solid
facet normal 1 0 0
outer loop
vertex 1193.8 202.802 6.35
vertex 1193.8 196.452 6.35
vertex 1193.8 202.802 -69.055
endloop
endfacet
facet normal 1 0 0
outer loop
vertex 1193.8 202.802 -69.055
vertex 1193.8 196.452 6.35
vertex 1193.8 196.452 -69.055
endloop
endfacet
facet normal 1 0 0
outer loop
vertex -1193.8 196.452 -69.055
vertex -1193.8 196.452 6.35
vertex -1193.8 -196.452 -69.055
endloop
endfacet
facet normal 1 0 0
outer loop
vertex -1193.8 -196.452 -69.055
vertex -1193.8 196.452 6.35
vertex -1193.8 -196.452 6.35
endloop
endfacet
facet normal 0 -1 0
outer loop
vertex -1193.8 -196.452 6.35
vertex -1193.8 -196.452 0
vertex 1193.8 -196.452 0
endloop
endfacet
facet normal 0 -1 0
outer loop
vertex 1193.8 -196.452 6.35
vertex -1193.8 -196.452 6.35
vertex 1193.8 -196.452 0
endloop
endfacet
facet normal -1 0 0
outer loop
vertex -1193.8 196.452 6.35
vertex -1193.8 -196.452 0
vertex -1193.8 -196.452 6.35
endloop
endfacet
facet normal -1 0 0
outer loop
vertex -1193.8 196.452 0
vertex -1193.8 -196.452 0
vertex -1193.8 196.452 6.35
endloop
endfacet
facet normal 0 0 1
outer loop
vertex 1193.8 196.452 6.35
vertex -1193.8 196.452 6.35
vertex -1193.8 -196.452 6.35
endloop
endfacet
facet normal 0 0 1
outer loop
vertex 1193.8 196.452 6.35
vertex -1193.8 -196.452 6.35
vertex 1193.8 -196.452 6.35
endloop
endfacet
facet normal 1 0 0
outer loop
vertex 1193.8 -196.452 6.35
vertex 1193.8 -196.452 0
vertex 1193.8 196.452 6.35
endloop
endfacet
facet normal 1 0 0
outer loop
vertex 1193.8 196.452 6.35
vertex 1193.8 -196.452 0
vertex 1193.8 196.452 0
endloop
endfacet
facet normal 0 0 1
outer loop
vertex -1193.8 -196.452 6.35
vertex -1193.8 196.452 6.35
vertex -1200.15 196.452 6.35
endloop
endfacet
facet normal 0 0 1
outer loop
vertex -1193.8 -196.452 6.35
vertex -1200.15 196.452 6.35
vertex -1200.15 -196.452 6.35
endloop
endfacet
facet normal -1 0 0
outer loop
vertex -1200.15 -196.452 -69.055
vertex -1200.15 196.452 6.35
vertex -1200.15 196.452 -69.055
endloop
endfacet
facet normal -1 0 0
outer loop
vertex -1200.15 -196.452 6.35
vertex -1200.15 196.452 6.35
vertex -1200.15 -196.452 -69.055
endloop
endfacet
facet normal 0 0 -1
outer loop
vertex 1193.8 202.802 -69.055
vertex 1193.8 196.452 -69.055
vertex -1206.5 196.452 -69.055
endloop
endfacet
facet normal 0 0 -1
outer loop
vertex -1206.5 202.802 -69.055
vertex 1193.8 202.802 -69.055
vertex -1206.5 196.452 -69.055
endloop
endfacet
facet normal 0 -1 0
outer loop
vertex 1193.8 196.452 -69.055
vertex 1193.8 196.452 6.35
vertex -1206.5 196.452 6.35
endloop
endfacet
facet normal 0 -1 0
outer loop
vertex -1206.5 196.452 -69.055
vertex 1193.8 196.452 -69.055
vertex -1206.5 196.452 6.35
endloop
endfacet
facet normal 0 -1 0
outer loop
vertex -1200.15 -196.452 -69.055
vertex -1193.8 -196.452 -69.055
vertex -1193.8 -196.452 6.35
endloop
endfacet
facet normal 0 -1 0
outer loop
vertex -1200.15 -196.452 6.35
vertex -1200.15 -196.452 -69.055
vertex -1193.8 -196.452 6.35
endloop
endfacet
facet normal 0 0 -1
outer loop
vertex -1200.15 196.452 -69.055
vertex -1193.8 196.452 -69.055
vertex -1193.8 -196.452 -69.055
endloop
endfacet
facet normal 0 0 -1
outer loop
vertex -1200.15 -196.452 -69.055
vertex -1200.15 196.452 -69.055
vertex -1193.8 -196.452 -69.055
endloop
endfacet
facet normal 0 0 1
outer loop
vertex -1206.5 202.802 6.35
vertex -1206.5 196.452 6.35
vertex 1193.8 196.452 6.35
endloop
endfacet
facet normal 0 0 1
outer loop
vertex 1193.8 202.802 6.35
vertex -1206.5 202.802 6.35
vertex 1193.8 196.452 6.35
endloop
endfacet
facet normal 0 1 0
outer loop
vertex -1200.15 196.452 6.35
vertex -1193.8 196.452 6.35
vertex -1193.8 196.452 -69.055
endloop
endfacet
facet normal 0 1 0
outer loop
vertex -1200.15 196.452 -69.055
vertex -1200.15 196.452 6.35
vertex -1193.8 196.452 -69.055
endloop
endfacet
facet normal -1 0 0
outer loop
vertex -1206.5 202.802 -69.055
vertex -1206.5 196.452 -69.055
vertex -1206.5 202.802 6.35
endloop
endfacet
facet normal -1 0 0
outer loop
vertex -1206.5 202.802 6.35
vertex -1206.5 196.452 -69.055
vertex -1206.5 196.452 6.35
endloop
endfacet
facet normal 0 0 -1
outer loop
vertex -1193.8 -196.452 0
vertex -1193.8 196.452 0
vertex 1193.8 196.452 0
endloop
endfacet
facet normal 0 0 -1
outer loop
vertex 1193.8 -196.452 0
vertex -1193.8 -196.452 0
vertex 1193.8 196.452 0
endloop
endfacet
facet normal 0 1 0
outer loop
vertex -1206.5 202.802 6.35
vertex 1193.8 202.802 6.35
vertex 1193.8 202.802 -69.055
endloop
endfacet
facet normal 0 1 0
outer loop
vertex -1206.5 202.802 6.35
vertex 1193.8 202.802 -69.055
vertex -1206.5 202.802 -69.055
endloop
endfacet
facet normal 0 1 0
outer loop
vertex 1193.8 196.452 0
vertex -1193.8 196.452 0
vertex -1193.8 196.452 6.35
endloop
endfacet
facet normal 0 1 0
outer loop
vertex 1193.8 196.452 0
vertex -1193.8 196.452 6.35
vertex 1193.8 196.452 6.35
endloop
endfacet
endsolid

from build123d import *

# Parameters (mm, degrees)
F0_W     = 2387.6
F0_H     = 392.90498
F1_DEPTH = 6.35
F2_W     = 392.90498
F2_H     = 69.05498
F2_H_2   = 6.35
F3_DEPTH = 6.35
F4_W     = 2387.6
F4_H     = 6.35
F5_DEPTH = 6.35


with BuildPart() as f1:
    # F0 (on Top) → F1 (new body)
    with BuildSketch(Plane.XY):
        Rectangle(F0_W, F0_H)
    extrude(amount=F1_DEPTH)


with BuildPart() as f3:
    # F2 (on face) → F3 (new body)
    with BuildSketch(Plane(origin=(-1193.8, 0, 0), x_dir=(0, -1, 0), z_dir=(-1, 0, 0))):
        with Locations((0, -34.52749)):
            Rectangle(F2_W, F2_H)
        with Locations((0, 3.175)):
            Rectangle(F2_W, F2_H_2)
    extrude(amount=F3_DEPTH)


with BuildPart() as f5:
    # F4 (on face) → F5 (new body)
    with BuildSketch(Plane(origin=(0, 196.45249, 0), x_dir=(-1, 0, 0), z_dir=(0, 1, 0))):
        with Locations((0, 3.175)):
            Rectangle(F4_W, F4_H)
        Polygon((1206.5, 6.35), (1193.8, 6.35), (1193.8, 0), (-1193.8, 0), (-1193.8, -69.05498), (1206.5, -69.05498), align=None)
    extrude(amount=F5_DEPTH)


solid = Compound([f1.part, f3.part, f5.part])
